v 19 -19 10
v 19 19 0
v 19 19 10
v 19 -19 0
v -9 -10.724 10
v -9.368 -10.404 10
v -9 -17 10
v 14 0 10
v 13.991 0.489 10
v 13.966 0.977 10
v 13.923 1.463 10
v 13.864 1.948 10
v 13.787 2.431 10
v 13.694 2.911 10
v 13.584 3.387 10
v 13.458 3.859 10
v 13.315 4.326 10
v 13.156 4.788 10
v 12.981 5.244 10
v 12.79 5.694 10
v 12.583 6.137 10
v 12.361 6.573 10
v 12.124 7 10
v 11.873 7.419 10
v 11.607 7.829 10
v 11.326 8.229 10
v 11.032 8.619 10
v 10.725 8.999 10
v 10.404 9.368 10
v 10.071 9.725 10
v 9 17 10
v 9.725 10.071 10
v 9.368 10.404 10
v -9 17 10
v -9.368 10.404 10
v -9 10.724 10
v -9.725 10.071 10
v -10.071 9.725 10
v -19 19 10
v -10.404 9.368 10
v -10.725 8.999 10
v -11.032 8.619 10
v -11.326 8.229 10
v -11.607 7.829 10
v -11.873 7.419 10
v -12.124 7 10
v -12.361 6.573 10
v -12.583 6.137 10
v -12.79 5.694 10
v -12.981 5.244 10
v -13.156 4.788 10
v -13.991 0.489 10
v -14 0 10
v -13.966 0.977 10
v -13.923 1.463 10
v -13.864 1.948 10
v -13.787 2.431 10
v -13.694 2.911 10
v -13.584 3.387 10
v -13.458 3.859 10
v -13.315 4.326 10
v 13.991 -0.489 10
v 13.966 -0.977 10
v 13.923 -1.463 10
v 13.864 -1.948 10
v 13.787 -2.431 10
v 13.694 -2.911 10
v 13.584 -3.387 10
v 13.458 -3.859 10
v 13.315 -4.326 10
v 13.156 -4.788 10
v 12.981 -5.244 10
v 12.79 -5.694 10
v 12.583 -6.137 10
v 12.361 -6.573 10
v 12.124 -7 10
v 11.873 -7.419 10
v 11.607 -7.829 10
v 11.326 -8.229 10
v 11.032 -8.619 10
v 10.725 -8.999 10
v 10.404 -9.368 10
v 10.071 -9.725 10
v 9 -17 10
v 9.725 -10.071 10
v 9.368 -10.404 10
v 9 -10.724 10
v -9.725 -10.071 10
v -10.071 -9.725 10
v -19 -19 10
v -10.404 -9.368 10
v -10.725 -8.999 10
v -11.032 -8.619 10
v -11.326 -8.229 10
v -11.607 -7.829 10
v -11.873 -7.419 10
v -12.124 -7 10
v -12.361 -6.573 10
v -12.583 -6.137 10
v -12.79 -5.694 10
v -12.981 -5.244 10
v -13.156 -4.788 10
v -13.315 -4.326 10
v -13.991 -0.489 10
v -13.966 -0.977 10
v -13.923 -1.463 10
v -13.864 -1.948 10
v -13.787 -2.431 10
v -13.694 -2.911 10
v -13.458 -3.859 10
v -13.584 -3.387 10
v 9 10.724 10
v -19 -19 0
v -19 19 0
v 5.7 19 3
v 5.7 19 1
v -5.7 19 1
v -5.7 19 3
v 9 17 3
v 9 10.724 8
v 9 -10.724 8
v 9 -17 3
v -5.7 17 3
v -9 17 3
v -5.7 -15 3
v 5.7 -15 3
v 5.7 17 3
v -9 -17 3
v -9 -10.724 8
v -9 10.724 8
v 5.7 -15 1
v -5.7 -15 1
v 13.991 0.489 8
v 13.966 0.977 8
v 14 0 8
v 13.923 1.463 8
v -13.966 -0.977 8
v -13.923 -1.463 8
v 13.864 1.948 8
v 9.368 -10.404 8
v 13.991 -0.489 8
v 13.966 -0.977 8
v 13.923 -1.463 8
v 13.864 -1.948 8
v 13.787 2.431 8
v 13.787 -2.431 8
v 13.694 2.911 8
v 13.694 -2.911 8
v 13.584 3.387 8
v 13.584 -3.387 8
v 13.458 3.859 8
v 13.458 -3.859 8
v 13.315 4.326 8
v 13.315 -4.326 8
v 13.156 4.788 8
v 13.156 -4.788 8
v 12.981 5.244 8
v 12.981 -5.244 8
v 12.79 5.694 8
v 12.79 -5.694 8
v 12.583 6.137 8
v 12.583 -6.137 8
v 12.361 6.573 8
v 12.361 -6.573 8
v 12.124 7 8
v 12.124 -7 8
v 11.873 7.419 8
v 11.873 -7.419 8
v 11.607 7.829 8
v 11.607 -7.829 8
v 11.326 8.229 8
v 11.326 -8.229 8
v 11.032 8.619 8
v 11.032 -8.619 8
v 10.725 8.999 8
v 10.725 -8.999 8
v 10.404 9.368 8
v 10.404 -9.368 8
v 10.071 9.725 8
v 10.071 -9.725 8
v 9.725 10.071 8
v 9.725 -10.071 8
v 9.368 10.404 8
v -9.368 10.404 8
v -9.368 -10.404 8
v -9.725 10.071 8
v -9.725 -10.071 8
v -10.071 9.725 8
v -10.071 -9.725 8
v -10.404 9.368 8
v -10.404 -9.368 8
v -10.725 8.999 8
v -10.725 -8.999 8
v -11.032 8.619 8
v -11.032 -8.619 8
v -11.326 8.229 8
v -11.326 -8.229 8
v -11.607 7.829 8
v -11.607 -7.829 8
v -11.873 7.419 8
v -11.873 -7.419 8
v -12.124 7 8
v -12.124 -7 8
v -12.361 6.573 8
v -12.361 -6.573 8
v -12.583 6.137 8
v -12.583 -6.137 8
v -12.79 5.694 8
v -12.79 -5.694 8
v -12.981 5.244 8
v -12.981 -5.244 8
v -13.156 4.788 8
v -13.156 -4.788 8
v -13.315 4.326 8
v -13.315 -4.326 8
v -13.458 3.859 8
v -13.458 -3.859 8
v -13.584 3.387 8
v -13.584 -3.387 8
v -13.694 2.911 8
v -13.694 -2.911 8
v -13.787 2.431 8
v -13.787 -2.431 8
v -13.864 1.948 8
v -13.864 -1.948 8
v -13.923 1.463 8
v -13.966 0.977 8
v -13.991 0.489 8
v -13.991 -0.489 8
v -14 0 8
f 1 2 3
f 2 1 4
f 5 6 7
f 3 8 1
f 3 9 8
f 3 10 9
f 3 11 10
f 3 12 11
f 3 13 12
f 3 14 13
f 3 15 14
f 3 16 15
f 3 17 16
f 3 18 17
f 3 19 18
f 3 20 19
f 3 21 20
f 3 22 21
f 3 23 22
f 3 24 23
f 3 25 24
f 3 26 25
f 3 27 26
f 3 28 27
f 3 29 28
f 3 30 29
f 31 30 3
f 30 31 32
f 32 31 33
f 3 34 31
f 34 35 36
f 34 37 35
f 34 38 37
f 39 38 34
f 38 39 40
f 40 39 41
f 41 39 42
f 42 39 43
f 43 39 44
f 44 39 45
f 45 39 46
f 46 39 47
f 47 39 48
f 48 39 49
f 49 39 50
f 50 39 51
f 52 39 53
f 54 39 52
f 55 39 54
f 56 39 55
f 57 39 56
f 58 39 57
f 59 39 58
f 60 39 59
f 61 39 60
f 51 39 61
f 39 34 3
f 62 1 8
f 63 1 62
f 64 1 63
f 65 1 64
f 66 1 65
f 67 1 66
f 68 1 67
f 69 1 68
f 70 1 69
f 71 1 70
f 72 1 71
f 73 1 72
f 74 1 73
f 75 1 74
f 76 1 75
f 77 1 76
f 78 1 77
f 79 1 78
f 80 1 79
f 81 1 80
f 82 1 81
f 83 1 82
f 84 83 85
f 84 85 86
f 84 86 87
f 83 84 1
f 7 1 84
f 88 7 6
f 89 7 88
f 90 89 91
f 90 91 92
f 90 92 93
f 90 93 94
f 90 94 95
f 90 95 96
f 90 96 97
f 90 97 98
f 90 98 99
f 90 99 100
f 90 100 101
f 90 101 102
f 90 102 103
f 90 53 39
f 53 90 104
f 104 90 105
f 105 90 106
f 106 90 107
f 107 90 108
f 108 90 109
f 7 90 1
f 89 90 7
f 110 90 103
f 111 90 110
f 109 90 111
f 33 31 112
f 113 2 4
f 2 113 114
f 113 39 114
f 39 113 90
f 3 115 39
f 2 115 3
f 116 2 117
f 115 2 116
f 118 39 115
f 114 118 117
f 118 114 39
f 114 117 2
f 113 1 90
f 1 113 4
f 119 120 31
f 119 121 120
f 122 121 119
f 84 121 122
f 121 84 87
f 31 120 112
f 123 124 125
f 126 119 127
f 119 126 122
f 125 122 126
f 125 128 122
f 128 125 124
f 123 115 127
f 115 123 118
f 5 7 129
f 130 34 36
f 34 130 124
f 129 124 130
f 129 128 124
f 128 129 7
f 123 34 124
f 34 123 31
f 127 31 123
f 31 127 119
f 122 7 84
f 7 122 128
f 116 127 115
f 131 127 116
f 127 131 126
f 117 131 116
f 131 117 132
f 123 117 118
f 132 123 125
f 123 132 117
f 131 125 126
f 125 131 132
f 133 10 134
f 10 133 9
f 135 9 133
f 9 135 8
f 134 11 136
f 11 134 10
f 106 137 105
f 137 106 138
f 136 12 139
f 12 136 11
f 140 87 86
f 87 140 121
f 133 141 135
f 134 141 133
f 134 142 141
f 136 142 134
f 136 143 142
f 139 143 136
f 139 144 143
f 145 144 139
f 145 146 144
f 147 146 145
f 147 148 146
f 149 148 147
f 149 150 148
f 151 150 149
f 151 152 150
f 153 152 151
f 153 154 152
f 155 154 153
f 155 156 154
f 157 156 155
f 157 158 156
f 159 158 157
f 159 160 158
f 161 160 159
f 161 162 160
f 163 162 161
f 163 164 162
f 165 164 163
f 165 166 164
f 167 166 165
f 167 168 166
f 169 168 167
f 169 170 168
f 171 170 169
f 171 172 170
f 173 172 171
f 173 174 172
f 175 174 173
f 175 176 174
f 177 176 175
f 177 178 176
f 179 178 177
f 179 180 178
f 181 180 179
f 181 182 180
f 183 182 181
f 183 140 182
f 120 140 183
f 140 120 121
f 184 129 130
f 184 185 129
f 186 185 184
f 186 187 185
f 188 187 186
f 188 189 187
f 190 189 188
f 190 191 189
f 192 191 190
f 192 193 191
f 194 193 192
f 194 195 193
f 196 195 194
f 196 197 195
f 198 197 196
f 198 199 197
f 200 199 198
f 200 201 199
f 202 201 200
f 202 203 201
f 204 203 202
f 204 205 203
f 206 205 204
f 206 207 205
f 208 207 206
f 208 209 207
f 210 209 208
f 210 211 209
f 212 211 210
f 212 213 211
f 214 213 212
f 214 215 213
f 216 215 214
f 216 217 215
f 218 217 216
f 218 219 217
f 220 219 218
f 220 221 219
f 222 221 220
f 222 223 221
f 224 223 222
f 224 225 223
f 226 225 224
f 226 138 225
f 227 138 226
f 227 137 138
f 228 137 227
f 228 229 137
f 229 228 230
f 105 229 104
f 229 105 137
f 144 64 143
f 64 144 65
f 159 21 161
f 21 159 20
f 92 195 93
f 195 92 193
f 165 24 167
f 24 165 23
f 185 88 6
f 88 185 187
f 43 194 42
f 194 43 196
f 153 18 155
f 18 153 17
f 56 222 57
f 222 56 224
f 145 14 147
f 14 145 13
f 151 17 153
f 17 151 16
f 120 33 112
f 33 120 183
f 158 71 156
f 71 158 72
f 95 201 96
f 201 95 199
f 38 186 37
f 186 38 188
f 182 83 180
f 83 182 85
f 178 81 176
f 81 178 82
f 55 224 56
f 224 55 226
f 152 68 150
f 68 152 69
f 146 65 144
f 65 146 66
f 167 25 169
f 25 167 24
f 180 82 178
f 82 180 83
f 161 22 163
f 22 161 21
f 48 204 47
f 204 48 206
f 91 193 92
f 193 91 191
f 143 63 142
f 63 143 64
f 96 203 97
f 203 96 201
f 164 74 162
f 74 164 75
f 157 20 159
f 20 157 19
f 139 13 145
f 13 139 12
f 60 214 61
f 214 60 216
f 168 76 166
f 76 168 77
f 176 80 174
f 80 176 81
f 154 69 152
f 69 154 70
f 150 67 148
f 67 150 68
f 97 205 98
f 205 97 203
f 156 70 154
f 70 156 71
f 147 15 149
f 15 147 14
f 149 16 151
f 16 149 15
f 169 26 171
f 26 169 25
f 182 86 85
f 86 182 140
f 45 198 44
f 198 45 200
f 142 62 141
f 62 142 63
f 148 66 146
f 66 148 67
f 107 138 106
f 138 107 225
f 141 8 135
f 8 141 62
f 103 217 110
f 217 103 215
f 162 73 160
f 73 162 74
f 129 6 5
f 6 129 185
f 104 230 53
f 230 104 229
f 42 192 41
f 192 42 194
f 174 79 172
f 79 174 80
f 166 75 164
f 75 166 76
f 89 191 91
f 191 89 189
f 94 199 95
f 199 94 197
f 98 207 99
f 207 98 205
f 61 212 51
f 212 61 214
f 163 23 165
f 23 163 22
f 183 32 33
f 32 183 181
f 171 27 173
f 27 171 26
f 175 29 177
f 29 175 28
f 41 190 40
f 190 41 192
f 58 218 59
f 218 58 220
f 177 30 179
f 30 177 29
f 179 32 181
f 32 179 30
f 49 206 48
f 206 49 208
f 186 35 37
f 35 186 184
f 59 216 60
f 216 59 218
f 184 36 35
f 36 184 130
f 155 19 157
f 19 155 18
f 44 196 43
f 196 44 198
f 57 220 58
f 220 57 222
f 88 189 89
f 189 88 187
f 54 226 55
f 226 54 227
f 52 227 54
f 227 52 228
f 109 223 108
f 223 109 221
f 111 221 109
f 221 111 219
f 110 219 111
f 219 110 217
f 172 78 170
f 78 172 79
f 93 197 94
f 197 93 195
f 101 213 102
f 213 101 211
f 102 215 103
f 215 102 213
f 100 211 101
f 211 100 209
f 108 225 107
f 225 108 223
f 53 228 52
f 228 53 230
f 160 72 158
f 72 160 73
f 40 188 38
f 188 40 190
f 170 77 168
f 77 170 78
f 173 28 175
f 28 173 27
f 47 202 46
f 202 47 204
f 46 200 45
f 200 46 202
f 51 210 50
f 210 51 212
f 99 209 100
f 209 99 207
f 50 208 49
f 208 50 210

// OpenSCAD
$fn=180;

base_width=38;
base_deep=10;

board_width=18;
board_height=34;
board_deep=7;

pinstage_width=11.4;
pinstage_height=34;
pinstage_deep=2;
pinstage_shift=2;

leds_radius=28;
leds_deep=2;

mr=3;

difference()
{
//    translate([-base_width/2+mr,-base_width/2+mr,0.5])
//    {
//        minkowski()
//        {
//            cube([base_width-mr*2, base_width-mr*2, base_deep-1]);
//            cylinder(r=mr, center=true);
//        }
//    }

    translate([-base_width/2,-base_width/2,0])
    {
        cube([base_width, base_width, base_deep]);
    }
    
    translate([-board_width/2,-board_height/2, base_deep-board_deep])
    {
        cube([board_width, board_height, board_deep]);
    }

    translate([-pinstage_width/2, -pinstage_height/2+pinstage_shift, base_deep-board_deep-pinstage_deep])
    {
        cube([pinstage_width, pinstage_height, pinstage_deep]);
    }
    translate([0,0,base_deep-leds_deep])
    {
        cylinder(h=leds_deep, d=leds_radius);
    }
}
